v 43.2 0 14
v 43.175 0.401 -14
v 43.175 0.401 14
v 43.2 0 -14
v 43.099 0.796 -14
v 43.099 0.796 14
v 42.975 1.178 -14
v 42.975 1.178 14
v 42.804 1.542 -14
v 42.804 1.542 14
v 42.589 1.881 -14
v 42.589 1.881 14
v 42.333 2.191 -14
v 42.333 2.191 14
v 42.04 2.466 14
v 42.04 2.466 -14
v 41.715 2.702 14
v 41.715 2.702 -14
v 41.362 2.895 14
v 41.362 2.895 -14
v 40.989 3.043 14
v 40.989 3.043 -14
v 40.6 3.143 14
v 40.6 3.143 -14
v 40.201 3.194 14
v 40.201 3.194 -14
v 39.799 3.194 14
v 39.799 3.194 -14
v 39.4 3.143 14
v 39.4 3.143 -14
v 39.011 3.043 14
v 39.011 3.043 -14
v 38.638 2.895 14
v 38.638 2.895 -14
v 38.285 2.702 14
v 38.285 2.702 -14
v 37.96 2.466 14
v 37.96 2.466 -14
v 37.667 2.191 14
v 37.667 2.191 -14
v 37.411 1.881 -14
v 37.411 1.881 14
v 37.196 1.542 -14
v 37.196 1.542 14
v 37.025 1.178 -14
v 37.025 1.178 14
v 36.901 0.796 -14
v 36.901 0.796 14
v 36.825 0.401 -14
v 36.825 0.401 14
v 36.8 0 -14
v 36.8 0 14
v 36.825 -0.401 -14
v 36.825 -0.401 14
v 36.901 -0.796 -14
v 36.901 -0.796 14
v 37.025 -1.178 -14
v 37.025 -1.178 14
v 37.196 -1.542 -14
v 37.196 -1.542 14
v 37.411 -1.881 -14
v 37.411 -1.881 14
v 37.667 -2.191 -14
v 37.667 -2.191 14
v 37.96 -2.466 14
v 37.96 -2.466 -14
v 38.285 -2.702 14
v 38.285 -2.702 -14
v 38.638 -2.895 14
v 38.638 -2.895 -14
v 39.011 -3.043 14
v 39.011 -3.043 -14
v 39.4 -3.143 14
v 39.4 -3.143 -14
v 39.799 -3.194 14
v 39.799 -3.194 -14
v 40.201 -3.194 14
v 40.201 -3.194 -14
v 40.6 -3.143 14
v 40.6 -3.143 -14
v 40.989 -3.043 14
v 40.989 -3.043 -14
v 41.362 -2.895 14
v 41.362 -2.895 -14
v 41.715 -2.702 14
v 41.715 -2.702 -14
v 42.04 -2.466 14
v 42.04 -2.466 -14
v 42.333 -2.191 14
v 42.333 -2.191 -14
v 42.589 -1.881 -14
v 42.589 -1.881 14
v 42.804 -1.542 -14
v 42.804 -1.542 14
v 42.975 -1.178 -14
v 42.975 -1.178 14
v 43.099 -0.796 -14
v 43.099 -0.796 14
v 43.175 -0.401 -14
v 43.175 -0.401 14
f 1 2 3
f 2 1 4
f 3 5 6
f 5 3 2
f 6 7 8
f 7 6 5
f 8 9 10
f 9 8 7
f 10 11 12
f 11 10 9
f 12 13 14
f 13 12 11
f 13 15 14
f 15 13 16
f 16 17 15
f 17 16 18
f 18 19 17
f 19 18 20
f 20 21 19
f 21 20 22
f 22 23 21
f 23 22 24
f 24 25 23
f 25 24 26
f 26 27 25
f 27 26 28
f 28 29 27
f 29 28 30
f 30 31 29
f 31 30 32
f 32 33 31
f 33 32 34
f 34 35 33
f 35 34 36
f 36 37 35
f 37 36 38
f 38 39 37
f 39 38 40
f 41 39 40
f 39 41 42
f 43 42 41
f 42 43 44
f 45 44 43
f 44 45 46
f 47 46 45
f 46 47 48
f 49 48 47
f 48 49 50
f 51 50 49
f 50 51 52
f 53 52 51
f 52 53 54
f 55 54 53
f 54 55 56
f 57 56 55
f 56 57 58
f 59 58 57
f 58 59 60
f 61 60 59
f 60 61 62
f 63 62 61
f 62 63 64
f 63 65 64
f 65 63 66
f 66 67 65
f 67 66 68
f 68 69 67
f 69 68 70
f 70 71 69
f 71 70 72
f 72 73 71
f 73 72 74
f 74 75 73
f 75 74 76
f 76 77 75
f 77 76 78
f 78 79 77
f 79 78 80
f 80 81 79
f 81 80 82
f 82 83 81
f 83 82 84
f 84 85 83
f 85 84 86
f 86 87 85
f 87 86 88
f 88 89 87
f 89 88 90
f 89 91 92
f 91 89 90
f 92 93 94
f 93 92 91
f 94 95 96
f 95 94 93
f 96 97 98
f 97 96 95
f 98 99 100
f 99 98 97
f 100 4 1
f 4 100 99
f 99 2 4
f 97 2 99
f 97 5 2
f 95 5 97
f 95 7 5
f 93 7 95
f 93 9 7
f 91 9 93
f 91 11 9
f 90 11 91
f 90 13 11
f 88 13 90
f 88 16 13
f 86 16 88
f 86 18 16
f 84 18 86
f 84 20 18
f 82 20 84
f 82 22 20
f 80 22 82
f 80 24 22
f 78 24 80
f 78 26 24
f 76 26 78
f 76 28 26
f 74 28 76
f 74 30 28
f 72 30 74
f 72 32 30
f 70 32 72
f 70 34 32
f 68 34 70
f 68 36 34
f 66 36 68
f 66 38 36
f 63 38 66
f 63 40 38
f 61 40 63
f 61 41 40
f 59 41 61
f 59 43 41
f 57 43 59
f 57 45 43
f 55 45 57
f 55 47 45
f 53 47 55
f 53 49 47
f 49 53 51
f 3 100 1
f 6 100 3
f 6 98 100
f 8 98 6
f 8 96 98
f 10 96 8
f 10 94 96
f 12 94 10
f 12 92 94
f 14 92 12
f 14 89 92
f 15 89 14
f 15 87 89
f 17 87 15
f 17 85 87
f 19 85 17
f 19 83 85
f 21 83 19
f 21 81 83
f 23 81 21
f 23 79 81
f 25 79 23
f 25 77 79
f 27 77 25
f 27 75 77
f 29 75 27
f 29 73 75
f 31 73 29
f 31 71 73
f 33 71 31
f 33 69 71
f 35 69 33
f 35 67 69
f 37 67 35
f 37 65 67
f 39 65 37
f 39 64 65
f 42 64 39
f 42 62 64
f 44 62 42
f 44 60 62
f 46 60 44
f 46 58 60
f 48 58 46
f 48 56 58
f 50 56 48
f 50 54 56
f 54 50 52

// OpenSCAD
// file: robot_settings.scad
main_box_x = 95; // 96
main_box_y = 102;
main_box_z = 74; // 74.5
wall_thickness = 2;

rail_gap = 2;
rail_inset = 7;

rail_thickness = 7;
rail_length = 250;
rail_width = 200;

raspberry_pi_screw_seperation_y = 57;
raspberry_pi_screw_seperation_z = 48;
raspberry_pi_peg_h = 4;

gears_module = 1;
pinion_gear_teeth = 30;
pinion_gear_width = 5;
pinion_gear_bore = 4;

gears_setback_distance = 25;
gear_post_height = 2 * pinion_gear_width + rail_thickness + 8 ;

steering_motor_mount_x = 45;
steering_motor_mount_y = 36;
steering_motor_mount_z = 18;
steering_motor_mount_setback_distance = gears_setback_distance + 16;

dc_motor_drivertype = "Teyleten"; // Teyleten
isAdafruit = (dc_motor_drivertype == "Adafruit");

drv8871_x = isAdafruit ? 20.3 : 21.6;
drv8871_y = isAdafruit ?  24 : 25;

drv8871_z = 2;
drv8871_screw_d = 2.5;
drv8871_solder_points_z = 2;

drv8871mount_edge_x = 1.5;
drv8871mount_edge_wall = 3;
drv8871mount_z = 5;
drv8871mount_x = drv8871_x +  drv8871mount_edge_wall - 2* drv8871mount_edge_x;
drv8871mount_y = 19;

drv8871_screw_distance = 15.64;
drv8871_solder_points_d = 1.66;
drv8871_solder_offset_y = 4.4;
drv8871_solder_inner_points_distance = 5;
drv8871_solder_outer_points_distance = 12;

dc_motor_housing_minus_encoder_z = 48;
dc_motor_encoder_z = 9.33;
dc_motor_encoder_wheel_d = 13.4;
dc_motor_encoder_wheel_thickness = 5;
dc_motor_encoder_wheel_gap = 3;
dc_motor_encoder_circuit_thickness = 2;
dc_motor_cutout_d = 24.8;
dc_motor_cutout_z = 19.5;

dc_motor_screw_head_z = 2;
dc_motor_screw_head_d = 5.6;
dc_motor_screw_d = 3.2;
dc_motor_screw_offset = 8.5;

dc_motor_axle_ring_z = 3;
dc_motor_axle_ring_d = 7.2;
dc_motor_axle_cutout_d = 4.5;
dc_motor_axle_cutout_z = 10;
dc_motor_axle_notch_cutout = 0.4;
dc_motor_axle_notch_cutout_z = 6;

pdmount_x = 20;
pdmount_y = 30;
pdmount_z = 2;
pdmount_edge_x = 1.5;
pdmount_edge_wall = 3;

steering_shaft_z = 45;
steering_shaft_d = 7;
steering_shaft_motor_fitting_d = 9;
coupler_length = 24.6;
coupler_diameter = 14;
coupler_screw_d = 4;
coupler_screw_z_offset = 5;
coupler_gear_side_insert = 12.6;
steering_shaft_with_coupler_z = steering_shaft_z - coupler_gear_side_insert;

lidar_mount_y = 110;
lidar_mount_x = 65 + 20;
lidar_narrow_screws = 40;
lidar_wide_screws = 56;
lidar_front_to_back_screws = 70;
lidar_screw_d = 3;
lidar_circuitboard_x = 20;
lidar_circuitboard_y = 35;
lidar_circuitboard_z = 1.2;
lidar_cord_length = 29;

ball_bearing_height = 7;
ball_bearing_outer_diameter = 22;
ball_bearing_inner_diameter = 8;

 armature_holder_height = 20;
 armature_holder_thickness = 8;
pull_bar_peg_r = 3.3;
apparatus_locking_peg_d = 4;

rack_module = 1;
rack_length = main_box_x / 2;
rack_height = 10;
rack_width = 10;
rack_teeth = 30;
rack_bore = 3;

// tire hardware
axle_length = 30;
axle_reciever_inner_diameter = 7.75;
axle_reciever_length = 18.8;
axle_notch_length = 7;
axle_notch_cutout = 2.4;

// power distribution bar
power_bar_cutout_x = 96;
power_bar_y = 19.1;
power_bar_z = 1.5;
power_bar_screw_distance = 91.4;
power_bar_screw_d = 2.8;
power_bar_standoff_z = 5;
power_bar_standoff_d = 6.83;

// breadboard
breadboard_wall_thickness = 3;
breadboard_width = 55;
breadboard_length = 83;
breadboard_height = 10.5;
breadboard_notch_width = 3.8;
breadboard_longside_notch_separation = 58.2 - breadboard_notch_width / 2;
breadboard_shortside_notch_separation = 26.3 - breadboard_notch_width;

pico_expander_width = 63;
pico_expander_height = 57;
pico_screw_hole_offset = 3;
pico_screw_hole_d = 2.5;
// main file
include <robot_settings.scad>
$fn=50;
  
 print_front_rack_grab_bar_peg = true;
 print_apparatus_peg = false;
  

// this applies to all locking pegs
module apparatus_peg()
{
  translate([20, 0, 0])
  cylinder(h = ball_bearing_outer_diameter + 2, 
      d = apparatus_locking_peg_d - .1 , center = true);
}
if (print_apparatus_peg)
    apparatus_peg();

// this applies to the front grab bar
module front_rack_grab_bar_peg()
{
  translate([40, 0, 0])
   cylinder(h = armature_holder_height + 8, 
      r = pull_bar_peg_r - .1, center = true);
}
if (print_front_rack_grab_bar_peg)
  front_rack_grab_bar_peg();
